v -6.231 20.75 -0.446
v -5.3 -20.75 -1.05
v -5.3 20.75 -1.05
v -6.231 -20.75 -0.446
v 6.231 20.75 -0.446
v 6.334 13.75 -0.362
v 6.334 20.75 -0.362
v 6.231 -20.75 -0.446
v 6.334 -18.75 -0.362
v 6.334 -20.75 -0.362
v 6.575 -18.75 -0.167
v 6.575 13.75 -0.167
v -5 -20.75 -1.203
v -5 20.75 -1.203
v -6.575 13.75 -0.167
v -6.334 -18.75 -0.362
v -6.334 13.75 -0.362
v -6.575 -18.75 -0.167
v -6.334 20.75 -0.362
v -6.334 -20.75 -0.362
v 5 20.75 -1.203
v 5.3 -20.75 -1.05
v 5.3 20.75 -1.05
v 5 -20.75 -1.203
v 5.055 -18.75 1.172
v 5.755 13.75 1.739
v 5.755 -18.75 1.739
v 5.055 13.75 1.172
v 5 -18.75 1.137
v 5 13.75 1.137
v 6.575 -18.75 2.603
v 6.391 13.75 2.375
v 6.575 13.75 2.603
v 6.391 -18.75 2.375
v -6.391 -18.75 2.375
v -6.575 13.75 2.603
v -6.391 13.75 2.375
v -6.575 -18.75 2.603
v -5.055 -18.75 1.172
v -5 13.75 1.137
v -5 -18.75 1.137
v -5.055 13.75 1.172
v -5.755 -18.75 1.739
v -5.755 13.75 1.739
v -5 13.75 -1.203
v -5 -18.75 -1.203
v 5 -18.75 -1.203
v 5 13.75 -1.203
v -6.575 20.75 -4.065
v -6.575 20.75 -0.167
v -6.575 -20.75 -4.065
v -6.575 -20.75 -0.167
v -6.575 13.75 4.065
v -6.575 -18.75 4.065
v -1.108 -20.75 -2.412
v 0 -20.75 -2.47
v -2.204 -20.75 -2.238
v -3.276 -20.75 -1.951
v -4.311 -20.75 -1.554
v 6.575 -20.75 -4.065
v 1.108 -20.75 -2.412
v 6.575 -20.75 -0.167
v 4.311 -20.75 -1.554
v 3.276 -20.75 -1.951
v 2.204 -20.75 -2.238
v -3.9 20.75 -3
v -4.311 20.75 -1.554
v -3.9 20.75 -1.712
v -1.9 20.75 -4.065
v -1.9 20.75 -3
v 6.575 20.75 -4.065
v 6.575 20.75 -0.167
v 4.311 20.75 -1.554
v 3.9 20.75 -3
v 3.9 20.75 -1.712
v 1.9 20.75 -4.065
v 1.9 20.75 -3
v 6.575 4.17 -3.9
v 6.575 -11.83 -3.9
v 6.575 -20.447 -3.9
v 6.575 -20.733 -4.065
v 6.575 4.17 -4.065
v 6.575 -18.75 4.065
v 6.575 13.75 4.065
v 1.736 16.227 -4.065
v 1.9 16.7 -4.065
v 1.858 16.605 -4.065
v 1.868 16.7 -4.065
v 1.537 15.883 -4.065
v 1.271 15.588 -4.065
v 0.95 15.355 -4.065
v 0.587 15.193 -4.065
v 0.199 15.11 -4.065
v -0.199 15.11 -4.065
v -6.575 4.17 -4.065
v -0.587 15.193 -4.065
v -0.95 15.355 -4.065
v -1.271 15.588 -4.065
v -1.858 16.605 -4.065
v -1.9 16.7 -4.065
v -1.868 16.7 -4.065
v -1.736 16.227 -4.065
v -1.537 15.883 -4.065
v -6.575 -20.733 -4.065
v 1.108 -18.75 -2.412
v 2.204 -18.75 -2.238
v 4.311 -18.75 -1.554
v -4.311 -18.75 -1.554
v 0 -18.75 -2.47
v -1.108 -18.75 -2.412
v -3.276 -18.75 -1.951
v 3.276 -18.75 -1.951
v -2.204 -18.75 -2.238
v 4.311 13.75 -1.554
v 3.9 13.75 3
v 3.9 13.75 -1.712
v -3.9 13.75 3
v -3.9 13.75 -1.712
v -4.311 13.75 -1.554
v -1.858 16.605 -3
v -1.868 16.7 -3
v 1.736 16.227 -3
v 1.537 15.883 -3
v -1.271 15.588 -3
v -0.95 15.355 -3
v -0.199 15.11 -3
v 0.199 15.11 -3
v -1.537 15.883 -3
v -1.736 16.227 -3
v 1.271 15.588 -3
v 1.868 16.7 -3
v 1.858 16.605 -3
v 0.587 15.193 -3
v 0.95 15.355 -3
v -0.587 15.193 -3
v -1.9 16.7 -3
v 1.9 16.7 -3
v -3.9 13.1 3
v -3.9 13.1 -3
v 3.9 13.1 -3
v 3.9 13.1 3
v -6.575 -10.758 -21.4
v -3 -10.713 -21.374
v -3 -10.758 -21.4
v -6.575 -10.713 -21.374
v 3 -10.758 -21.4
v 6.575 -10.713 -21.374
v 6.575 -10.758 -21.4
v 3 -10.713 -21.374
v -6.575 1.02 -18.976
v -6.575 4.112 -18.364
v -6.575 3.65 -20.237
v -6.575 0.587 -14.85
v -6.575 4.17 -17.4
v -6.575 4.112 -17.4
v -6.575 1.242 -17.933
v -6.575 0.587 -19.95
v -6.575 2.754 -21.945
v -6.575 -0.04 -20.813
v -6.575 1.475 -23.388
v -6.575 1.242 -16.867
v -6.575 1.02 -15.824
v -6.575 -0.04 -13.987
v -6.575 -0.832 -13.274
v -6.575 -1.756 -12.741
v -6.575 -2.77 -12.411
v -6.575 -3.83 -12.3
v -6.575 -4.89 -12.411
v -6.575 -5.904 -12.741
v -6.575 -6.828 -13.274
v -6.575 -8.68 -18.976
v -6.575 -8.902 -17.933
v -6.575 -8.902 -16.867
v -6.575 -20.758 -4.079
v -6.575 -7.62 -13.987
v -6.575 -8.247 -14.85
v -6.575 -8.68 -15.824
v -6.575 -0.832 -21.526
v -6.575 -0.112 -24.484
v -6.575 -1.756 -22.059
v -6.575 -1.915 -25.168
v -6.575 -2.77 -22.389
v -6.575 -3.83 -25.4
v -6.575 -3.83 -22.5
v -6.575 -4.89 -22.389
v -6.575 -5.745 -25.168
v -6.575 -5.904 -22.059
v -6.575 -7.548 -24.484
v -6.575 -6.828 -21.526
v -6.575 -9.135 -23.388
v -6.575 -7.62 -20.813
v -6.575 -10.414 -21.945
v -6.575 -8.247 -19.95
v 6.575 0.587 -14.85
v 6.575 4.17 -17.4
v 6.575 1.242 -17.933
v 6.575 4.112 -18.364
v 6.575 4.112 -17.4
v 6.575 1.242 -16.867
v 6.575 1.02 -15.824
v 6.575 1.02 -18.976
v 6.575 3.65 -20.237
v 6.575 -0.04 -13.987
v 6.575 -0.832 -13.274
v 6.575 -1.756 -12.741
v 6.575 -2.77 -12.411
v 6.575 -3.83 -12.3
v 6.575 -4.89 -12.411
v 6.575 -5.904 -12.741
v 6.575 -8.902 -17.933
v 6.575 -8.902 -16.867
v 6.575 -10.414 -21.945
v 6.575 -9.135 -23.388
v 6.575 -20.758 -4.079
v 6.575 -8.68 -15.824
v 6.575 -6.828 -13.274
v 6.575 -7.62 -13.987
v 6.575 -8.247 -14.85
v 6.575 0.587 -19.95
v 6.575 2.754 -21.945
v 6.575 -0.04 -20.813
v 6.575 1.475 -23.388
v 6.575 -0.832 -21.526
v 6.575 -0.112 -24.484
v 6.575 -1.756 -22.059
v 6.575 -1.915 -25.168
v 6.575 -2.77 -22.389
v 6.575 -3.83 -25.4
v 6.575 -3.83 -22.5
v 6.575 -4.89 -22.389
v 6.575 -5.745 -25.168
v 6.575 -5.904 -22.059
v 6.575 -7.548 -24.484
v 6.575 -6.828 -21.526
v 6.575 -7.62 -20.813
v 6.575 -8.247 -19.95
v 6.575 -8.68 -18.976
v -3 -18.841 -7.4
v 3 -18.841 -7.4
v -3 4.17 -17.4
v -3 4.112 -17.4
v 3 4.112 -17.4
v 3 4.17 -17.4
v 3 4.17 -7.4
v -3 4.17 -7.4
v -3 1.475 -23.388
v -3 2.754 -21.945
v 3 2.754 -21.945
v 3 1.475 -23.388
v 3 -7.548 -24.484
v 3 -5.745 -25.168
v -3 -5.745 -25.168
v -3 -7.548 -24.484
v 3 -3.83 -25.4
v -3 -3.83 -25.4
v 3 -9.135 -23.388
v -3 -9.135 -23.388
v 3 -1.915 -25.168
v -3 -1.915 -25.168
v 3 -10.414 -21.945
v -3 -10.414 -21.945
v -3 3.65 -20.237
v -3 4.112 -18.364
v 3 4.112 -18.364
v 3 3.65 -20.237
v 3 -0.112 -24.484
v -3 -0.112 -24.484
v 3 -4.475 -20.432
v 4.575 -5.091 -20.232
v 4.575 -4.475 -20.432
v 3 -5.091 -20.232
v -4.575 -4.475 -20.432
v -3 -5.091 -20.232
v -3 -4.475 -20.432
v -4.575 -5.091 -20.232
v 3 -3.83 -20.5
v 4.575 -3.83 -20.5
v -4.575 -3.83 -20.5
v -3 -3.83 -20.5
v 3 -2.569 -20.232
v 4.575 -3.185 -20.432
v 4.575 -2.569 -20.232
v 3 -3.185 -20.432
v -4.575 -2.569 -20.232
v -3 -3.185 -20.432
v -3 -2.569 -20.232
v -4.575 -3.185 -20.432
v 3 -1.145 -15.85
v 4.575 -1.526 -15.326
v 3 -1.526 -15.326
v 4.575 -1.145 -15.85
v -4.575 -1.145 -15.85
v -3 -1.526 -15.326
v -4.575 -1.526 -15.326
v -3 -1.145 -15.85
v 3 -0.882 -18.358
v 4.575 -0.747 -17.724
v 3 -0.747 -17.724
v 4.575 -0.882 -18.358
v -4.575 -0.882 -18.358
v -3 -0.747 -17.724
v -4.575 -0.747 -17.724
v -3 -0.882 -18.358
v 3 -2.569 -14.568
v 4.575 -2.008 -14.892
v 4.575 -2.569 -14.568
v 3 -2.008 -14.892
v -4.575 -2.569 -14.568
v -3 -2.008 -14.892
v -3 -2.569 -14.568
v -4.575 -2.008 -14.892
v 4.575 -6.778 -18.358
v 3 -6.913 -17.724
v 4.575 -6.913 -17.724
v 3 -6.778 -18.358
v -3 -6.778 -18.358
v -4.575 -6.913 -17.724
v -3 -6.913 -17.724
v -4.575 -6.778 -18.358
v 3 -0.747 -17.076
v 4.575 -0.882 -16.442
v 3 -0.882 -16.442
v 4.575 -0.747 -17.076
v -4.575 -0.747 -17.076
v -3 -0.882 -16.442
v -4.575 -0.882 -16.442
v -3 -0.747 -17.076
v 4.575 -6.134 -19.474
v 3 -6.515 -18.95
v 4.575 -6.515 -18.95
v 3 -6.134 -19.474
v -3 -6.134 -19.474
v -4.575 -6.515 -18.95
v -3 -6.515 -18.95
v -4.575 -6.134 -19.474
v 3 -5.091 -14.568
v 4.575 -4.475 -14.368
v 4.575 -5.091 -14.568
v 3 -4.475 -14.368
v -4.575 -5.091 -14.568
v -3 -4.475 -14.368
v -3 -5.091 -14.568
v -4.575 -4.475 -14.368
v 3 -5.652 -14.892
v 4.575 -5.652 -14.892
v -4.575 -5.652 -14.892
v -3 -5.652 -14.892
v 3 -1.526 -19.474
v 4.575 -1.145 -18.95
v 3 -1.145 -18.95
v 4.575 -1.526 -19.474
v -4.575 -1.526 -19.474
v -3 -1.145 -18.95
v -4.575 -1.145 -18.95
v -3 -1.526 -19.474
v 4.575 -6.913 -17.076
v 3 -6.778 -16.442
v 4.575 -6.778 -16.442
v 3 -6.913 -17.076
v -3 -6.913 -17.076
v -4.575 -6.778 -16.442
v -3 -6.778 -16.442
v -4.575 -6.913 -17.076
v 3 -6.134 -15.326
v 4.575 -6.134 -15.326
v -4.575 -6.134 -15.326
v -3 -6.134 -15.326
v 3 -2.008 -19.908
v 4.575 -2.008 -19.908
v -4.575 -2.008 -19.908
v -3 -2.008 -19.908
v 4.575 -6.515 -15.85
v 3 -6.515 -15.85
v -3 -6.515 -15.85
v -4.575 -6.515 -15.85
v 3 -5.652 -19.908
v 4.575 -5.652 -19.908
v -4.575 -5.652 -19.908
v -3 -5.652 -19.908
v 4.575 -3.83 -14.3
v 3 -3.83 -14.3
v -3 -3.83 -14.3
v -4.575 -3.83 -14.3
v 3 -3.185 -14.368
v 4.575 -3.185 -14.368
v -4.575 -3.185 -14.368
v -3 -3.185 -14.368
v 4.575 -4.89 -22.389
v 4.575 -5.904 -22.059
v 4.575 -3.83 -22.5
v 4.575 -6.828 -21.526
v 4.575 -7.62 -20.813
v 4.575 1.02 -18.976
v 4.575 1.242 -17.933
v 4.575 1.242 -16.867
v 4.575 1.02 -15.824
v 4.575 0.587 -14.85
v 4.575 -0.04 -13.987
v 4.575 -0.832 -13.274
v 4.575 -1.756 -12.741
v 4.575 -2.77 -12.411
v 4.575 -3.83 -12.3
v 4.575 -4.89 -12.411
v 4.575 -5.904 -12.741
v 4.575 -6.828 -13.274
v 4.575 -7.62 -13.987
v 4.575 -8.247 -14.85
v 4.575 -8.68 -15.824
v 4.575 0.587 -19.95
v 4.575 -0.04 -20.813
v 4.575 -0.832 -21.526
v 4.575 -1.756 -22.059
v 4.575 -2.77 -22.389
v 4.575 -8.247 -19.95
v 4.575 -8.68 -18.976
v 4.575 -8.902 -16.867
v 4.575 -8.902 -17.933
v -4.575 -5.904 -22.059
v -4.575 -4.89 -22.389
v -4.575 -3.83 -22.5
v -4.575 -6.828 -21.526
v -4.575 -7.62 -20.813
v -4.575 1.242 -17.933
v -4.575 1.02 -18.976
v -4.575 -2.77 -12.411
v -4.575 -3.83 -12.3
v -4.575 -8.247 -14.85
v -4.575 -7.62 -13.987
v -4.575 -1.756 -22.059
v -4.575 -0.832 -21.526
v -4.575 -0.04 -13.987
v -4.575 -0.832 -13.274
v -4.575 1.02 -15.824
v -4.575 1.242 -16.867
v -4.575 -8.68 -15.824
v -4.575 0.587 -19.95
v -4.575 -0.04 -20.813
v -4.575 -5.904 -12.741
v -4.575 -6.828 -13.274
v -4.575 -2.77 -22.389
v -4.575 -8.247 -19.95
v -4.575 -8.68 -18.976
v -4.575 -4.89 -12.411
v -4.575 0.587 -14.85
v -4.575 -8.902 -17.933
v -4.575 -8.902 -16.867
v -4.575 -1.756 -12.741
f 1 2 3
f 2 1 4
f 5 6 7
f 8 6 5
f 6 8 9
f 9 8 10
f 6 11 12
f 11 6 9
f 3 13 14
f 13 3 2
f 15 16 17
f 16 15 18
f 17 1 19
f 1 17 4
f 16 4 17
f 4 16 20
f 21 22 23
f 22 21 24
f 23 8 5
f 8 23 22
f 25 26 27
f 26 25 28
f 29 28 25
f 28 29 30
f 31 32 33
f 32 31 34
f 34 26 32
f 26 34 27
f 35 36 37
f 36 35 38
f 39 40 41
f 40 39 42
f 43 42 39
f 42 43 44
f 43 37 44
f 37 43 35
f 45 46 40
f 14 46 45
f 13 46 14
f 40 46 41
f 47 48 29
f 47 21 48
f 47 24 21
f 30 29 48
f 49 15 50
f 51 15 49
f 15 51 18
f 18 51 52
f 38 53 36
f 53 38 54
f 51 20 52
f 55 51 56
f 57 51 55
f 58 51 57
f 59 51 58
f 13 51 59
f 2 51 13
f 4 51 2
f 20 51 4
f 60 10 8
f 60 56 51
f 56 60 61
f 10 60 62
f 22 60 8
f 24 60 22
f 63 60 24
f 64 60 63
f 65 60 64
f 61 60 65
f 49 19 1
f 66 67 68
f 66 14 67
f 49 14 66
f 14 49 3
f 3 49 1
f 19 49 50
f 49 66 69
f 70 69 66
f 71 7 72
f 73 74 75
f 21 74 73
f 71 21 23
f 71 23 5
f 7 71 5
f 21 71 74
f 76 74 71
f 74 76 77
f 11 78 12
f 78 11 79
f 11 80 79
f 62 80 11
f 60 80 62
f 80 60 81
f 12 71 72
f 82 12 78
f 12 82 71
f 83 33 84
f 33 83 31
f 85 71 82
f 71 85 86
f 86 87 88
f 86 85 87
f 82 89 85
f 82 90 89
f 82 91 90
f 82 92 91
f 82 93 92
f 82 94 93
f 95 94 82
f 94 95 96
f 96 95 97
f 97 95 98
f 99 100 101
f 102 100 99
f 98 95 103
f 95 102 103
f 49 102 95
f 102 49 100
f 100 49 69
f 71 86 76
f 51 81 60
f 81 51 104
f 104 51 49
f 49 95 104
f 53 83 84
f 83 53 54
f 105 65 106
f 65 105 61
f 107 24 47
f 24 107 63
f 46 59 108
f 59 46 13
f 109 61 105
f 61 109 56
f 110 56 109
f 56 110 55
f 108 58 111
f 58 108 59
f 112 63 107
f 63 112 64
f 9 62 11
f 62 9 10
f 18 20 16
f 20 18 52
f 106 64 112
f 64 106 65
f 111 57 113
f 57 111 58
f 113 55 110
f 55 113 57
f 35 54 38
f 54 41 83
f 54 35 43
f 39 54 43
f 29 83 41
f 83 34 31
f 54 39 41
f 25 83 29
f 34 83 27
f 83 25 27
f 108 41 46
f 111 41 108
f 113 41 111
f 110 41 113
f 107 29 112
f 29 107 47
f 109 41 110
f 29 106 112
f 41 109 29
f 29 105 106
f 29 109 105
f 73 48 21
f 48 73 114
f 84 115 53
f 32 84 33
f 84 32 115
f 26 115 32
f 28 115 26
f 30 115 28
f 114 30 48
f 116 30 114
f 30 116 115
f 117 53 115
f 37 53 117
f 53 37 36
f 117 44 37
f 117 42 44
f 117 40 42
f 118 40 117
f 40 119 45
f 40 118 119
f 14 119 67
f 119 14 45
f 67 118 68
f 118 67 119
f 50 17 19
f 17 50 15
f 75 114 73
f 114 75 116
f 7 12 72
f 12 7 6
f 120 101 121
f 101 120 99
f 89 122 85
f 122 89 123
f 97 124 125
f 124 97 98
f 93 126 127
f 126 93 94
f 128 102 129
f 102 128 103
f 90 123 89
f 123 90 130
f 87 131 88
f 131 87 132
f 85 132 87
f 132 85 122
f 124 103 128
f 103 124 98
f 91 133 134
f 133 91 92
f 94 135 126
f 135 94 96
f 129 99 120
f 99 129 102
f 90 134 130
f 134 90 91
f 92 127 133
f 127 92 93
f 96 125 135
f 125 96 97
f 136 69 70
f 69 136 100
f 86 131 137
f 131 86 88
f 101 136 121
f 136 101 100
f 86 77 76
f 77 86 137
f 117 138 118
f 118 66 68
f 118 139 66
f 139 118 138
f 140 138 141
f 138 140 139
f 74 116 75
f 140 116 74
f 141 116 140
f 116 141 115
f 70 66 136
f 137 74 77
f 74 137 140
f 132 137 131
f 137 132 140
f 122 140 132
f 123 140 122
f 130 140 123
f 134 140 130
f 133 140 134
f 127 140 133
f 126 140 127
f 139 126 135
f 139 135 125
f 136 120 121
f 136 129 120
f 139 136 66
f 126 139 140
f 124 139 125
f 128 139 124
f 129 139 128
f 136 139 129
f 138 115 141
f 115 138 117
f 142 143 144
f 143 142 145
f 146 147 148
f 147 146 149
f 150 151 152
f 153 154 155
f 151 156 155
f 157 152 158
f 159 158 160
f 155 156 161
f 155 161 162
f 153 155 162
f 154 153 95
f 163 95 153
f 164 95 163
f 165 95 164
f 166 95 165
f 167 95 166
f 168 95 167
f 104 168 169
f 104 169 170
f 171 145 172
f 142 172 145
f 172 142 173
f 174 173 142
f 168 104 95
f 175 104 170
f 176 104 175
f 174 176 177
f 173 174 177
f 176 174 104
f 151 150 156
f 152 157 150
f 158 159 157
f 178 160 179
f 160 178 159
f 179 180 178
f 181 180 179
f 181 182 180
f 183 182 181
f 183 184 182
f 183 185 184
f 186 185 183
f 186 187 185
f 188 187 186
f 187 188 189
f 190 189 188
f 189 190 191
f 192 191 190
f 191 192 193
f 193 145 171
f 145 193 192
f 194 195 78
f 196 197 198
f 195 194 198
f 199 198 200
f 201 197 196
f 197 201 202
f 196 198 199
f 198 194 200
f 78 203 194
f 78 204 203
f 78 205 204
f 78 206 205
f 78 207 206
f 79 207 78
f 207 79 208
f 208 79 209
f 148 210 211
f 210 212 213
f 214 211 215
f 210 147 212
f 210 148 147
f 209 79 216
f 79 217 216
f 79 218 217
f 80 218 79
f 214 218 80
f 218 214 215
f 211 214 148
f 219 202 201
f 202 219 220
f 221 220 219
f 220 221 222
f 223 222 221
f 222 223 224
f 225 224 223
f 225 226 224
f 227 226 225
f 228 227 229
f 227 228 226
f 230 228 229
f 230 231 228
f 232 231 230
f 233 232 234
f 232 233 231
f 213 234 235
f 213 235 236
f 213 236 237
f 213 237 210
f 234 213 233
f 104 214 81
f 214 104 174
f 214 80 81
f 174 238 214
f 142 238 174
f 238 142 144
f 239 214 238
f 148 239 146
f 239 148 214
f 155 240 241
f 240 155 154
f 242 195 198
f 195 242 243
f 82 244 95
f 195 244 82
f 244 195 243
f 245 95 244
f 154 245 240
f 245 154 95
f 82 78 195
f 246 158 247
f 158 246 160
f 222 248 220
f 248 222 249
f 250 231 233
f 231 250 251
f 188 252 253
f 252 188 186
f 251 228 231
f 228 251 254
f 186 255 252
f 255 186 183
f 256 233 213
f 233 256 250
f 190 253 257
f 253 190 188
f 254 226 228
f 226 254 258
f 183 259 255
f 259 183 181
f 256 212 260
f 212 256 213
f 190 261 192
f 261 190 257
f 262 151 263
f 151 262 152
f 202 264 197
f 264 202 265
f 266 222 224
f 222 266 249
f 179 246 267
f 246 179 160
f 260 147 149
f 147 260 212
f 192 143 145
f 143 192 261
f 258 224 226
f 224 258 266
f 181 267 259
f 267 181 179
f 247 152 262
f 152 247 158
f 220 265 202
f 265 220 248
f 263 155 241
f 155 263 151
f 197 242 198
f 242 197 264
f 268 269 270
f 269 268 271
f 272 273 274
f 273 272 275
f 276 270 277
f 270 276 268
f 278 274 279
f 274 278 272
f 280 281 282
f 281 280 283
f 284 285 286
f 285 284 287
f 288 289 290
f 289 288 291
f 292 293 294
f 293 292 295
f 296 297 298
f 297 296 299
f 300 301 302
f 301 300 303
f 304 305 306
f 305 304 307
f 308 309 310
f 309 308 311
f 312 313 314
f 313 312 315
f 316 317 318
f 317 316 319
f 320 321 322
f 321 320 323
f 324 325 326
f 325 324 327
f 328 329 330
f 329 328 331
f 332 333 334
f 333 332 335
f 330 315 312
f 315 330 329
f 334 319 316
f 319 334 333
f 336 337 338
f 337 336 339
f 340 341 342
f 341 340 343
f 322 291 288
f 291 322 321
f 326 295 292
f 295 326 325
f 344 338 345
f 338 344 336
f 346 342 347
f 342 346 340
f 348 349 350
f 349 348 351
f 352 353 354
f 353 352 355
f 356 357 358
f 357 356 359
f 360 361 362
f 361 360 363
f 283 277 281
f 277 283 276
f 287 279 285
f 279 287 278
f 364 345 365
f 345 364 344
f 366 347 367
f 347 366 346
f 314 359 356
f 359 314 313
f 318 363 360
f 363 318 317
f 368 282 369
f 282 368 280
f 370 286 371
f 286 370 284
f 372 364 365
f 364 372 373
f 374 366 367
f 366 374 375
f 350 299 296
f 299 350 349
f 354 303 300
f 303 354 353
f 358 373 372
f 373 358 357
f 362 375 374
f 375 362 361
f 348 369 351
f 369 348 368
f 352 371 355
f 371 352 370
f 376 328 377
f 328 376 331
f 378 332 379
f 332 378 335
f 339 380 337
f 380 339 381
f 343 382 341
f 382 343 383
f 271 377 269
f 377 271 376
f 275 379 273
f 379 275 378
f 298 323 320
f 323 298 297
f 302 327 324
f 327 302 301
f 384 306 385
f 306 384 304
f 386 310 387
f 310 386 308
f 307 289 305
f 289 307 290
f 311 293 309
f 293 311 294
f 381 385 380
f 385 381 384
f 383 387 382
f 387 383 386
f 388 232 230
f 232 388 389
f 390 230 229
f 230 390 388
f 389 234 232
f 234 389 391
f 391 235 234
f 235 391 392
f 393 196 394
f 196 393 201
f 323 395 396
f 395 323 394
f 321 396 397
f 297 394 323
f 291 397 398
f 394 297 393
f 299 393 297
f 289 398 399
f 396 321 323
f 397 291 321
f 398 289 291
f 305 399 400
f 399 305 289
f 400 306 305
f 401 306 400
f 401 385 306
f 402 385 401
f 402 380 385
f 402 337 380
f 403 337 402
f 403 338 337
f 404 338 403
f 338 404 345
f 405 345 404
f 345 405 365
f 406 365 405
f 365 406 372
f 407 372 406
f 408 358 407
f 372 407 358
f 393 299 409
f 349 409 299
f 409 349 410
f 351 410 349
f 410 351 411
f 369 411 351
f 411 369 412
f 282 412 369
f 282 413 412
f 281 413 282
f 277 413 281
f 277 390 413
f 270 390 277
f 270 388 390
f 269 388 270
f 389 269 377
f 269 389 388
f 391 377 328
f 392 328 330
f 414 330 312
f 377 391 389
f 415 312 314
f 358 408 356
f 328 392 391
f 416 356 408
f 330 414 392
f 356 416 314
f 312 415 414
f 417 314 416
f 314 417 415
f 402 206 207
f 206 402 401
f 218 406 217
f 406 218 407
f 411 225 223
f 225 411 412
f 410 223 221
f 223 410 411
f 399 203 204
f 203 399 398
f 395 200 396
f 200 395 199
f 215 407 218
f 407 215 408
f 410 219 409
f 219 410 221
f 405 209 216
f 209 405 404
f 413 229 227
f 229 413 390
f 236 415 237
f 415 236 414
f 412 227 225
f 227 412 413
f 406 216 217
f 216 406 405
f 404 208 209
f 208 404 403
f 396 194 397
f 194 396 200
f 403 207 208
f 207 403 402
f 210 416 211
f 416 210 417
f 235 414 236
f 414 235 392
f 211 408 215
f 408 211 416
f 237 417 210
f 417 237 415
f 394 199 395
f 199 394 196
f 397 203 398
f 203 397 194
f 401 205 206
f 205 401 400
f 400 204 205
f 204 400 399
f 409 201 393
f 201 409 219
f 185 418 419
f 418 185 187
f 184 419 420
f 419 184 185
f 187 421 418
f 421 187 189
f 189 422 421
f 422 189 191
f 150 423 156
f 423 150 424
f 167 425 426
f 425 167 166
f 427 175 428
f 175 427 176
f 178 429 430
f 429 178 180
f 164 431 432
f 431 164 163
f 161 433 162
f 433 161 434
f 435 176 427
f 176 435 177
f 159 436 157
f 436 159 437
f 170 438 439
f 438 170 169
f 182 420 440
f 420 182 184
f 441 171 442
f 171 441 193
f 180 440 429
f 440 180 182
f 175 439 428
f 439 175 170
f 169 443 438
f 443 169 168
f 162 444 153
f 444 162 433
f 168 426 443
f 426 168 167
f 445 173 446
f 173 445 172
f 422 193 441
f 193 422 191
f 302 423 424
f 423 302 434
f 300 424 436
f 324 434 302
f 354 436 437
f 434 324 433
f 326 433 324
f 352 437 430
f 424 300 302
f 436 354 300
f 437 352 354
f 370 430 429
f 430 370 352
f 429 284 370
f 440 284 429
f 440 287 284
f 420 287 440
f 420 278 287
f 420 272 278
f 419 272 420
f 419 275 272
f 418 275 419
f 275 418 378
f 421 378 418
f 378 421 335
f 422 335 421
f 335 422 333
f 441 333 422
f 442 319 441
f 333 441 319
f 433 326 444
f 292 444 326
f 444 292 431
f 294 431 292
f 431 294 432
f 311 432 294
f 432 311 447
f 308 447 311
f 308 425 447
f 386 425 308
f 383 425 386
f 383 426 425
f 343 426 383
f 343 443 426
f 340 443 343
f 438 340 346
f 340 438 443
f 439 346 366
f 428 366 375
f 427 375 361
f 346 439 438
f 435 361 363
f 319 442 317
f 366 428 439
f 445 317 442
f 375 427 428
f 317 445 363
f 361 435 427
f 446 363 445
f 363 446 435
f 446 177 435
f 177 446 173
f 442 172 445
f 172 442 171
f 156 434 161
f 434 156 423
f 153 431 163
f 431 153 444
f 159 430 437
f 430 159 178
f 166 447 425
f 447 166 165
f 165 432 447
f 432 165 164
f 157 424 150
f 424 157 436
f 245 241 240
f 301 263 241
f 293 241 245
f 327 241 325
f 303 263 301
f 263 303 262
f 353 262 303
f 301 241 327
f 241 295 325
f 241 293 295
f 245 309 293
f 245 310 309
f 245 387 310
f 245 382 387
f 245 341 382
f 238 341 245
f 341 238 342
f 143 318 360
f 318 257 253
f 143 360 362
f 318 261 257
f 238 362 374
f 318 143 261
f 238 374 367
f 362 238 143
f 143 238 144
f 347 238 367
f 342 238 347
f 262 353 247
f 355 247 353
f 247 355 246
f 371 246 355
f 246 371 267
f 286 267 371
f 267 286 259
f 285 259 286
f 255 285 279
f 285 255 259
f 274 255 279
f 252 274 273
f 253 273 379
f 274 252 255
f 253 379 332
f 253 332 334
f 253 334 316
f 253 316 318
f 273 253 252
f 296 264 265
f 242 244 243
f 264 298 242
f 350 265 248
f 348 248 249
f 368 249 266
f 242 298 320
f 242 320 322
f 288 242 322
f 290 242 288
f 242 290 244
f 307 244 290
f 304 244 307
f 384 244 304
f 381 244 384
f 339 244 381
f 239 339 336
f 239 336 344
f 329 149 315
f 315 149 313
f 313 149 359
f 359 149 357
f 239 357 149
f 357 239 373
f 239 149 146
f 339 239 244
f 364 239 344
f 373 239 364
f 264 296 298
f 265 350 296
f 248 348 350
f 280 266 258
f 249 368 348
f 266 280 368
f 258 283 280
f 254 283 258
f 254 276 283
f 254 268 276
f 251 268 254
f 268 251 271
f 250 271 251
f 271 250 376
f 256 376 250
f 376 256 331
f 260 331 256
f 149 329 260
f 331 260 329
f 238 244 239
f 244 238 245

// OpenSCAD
md = 21.2;
ml = 41.5;
mt = 1.55; mt = 2;

sl = ml;
sw = 10.0;

fn = 60;

// microphone part ////////////////////////

module tube () {
    difference() {
        cylinder(h=1.1*ml, d=md, center=true, $fn=fn);
        cylinder(h=1.1*ml, d=md-2*mt, center=true, $fn=fn);
        translate([0, md/2.5, 0])
            cube([sw, 6, 1.1*sl],true);
    }
}


pw = 13.15;
ph = 8.13;
pl = ml;

module bracket () {
    difference() {
        cube([pw, ph, pl],true);
        translate([0, -ph, 0])
            tube();
        translate([0, -ph, ml/2])
            cylinder(h=2*2, d=md, center=true, $fn=fn);
        translate([0, -ph, -ml/2])
            cylinder(h=2*7, d=md, center=true, $fn=fn);
    }
}

fd = 3.8;
fl = 7.8;

module feedthrough () {
    translate([0, 0, -17]) {
        rotate([90,0,0])
            cylinder(h=1.1*ph, d=fd, center=true, $fn=30);
        translate([0,3,-3.5])
            cube([fd,fd,2*fd],true);
        cube([fl,6,fl], true);
    }
}

module mic_part () {
    difference() {
        bracket();
        feedthrough();
    }
}


// stand part /////////////

module hole (z,r1,r2) {
    i = 2; 
    fn = 30;
    translate([0,0,-1]) cylinder (z+2, r=r1, $fn=fn);
    translate([0,0,-1]) cylinder (i+1, r=r2, $fn=fn);
    translate([0,0,z-i]) cylinder (i+1, r=r2, $fn=fn);
}

module slot (z) {
    s = 6;
    d = 10;
    translate([-d,-10,(z-s)/2]) cube([20,30,s]);
}
   
module body (x,y,z) {
    x2 = 13.5;
    difference() {
        rotate([0,0,-30]) translate([-x,-y,0]) cube([x,2*y,z]);
        translate([-x2-10,-2,-1]) cube([10,20,z+2]);
    }
    translate([-x2,-y,0]) cube([x2,2*y,z]);
    cylinder(z, r=y);    
}


module hinge () {
    x = 20;
    y = 8;
    z = pw;
    s = 6.5;
    difference() {
        body(x,y,z);
        hole(z,6.2/2,10.2/2);
        slot(z);
    }
    *translate([-13.3,-26.07,0])
        platform(z);
}


// final assembly /////////

module assembly() {
    print = [90,180,0];
    design = [0,0,0];
    rotate(print) {
        mic_part();
        translate([-pw/2,17.4,3.83])
            //cube([pw,10,4], true);
            rotate([90,0,90])
                hinge();
    }
}

module testprint() {
    intersection() {
        assembly();
        translate([0,17,-5])
            cube([20,25,20],true);
    }
}

if (1) assembly();
else testprint();
